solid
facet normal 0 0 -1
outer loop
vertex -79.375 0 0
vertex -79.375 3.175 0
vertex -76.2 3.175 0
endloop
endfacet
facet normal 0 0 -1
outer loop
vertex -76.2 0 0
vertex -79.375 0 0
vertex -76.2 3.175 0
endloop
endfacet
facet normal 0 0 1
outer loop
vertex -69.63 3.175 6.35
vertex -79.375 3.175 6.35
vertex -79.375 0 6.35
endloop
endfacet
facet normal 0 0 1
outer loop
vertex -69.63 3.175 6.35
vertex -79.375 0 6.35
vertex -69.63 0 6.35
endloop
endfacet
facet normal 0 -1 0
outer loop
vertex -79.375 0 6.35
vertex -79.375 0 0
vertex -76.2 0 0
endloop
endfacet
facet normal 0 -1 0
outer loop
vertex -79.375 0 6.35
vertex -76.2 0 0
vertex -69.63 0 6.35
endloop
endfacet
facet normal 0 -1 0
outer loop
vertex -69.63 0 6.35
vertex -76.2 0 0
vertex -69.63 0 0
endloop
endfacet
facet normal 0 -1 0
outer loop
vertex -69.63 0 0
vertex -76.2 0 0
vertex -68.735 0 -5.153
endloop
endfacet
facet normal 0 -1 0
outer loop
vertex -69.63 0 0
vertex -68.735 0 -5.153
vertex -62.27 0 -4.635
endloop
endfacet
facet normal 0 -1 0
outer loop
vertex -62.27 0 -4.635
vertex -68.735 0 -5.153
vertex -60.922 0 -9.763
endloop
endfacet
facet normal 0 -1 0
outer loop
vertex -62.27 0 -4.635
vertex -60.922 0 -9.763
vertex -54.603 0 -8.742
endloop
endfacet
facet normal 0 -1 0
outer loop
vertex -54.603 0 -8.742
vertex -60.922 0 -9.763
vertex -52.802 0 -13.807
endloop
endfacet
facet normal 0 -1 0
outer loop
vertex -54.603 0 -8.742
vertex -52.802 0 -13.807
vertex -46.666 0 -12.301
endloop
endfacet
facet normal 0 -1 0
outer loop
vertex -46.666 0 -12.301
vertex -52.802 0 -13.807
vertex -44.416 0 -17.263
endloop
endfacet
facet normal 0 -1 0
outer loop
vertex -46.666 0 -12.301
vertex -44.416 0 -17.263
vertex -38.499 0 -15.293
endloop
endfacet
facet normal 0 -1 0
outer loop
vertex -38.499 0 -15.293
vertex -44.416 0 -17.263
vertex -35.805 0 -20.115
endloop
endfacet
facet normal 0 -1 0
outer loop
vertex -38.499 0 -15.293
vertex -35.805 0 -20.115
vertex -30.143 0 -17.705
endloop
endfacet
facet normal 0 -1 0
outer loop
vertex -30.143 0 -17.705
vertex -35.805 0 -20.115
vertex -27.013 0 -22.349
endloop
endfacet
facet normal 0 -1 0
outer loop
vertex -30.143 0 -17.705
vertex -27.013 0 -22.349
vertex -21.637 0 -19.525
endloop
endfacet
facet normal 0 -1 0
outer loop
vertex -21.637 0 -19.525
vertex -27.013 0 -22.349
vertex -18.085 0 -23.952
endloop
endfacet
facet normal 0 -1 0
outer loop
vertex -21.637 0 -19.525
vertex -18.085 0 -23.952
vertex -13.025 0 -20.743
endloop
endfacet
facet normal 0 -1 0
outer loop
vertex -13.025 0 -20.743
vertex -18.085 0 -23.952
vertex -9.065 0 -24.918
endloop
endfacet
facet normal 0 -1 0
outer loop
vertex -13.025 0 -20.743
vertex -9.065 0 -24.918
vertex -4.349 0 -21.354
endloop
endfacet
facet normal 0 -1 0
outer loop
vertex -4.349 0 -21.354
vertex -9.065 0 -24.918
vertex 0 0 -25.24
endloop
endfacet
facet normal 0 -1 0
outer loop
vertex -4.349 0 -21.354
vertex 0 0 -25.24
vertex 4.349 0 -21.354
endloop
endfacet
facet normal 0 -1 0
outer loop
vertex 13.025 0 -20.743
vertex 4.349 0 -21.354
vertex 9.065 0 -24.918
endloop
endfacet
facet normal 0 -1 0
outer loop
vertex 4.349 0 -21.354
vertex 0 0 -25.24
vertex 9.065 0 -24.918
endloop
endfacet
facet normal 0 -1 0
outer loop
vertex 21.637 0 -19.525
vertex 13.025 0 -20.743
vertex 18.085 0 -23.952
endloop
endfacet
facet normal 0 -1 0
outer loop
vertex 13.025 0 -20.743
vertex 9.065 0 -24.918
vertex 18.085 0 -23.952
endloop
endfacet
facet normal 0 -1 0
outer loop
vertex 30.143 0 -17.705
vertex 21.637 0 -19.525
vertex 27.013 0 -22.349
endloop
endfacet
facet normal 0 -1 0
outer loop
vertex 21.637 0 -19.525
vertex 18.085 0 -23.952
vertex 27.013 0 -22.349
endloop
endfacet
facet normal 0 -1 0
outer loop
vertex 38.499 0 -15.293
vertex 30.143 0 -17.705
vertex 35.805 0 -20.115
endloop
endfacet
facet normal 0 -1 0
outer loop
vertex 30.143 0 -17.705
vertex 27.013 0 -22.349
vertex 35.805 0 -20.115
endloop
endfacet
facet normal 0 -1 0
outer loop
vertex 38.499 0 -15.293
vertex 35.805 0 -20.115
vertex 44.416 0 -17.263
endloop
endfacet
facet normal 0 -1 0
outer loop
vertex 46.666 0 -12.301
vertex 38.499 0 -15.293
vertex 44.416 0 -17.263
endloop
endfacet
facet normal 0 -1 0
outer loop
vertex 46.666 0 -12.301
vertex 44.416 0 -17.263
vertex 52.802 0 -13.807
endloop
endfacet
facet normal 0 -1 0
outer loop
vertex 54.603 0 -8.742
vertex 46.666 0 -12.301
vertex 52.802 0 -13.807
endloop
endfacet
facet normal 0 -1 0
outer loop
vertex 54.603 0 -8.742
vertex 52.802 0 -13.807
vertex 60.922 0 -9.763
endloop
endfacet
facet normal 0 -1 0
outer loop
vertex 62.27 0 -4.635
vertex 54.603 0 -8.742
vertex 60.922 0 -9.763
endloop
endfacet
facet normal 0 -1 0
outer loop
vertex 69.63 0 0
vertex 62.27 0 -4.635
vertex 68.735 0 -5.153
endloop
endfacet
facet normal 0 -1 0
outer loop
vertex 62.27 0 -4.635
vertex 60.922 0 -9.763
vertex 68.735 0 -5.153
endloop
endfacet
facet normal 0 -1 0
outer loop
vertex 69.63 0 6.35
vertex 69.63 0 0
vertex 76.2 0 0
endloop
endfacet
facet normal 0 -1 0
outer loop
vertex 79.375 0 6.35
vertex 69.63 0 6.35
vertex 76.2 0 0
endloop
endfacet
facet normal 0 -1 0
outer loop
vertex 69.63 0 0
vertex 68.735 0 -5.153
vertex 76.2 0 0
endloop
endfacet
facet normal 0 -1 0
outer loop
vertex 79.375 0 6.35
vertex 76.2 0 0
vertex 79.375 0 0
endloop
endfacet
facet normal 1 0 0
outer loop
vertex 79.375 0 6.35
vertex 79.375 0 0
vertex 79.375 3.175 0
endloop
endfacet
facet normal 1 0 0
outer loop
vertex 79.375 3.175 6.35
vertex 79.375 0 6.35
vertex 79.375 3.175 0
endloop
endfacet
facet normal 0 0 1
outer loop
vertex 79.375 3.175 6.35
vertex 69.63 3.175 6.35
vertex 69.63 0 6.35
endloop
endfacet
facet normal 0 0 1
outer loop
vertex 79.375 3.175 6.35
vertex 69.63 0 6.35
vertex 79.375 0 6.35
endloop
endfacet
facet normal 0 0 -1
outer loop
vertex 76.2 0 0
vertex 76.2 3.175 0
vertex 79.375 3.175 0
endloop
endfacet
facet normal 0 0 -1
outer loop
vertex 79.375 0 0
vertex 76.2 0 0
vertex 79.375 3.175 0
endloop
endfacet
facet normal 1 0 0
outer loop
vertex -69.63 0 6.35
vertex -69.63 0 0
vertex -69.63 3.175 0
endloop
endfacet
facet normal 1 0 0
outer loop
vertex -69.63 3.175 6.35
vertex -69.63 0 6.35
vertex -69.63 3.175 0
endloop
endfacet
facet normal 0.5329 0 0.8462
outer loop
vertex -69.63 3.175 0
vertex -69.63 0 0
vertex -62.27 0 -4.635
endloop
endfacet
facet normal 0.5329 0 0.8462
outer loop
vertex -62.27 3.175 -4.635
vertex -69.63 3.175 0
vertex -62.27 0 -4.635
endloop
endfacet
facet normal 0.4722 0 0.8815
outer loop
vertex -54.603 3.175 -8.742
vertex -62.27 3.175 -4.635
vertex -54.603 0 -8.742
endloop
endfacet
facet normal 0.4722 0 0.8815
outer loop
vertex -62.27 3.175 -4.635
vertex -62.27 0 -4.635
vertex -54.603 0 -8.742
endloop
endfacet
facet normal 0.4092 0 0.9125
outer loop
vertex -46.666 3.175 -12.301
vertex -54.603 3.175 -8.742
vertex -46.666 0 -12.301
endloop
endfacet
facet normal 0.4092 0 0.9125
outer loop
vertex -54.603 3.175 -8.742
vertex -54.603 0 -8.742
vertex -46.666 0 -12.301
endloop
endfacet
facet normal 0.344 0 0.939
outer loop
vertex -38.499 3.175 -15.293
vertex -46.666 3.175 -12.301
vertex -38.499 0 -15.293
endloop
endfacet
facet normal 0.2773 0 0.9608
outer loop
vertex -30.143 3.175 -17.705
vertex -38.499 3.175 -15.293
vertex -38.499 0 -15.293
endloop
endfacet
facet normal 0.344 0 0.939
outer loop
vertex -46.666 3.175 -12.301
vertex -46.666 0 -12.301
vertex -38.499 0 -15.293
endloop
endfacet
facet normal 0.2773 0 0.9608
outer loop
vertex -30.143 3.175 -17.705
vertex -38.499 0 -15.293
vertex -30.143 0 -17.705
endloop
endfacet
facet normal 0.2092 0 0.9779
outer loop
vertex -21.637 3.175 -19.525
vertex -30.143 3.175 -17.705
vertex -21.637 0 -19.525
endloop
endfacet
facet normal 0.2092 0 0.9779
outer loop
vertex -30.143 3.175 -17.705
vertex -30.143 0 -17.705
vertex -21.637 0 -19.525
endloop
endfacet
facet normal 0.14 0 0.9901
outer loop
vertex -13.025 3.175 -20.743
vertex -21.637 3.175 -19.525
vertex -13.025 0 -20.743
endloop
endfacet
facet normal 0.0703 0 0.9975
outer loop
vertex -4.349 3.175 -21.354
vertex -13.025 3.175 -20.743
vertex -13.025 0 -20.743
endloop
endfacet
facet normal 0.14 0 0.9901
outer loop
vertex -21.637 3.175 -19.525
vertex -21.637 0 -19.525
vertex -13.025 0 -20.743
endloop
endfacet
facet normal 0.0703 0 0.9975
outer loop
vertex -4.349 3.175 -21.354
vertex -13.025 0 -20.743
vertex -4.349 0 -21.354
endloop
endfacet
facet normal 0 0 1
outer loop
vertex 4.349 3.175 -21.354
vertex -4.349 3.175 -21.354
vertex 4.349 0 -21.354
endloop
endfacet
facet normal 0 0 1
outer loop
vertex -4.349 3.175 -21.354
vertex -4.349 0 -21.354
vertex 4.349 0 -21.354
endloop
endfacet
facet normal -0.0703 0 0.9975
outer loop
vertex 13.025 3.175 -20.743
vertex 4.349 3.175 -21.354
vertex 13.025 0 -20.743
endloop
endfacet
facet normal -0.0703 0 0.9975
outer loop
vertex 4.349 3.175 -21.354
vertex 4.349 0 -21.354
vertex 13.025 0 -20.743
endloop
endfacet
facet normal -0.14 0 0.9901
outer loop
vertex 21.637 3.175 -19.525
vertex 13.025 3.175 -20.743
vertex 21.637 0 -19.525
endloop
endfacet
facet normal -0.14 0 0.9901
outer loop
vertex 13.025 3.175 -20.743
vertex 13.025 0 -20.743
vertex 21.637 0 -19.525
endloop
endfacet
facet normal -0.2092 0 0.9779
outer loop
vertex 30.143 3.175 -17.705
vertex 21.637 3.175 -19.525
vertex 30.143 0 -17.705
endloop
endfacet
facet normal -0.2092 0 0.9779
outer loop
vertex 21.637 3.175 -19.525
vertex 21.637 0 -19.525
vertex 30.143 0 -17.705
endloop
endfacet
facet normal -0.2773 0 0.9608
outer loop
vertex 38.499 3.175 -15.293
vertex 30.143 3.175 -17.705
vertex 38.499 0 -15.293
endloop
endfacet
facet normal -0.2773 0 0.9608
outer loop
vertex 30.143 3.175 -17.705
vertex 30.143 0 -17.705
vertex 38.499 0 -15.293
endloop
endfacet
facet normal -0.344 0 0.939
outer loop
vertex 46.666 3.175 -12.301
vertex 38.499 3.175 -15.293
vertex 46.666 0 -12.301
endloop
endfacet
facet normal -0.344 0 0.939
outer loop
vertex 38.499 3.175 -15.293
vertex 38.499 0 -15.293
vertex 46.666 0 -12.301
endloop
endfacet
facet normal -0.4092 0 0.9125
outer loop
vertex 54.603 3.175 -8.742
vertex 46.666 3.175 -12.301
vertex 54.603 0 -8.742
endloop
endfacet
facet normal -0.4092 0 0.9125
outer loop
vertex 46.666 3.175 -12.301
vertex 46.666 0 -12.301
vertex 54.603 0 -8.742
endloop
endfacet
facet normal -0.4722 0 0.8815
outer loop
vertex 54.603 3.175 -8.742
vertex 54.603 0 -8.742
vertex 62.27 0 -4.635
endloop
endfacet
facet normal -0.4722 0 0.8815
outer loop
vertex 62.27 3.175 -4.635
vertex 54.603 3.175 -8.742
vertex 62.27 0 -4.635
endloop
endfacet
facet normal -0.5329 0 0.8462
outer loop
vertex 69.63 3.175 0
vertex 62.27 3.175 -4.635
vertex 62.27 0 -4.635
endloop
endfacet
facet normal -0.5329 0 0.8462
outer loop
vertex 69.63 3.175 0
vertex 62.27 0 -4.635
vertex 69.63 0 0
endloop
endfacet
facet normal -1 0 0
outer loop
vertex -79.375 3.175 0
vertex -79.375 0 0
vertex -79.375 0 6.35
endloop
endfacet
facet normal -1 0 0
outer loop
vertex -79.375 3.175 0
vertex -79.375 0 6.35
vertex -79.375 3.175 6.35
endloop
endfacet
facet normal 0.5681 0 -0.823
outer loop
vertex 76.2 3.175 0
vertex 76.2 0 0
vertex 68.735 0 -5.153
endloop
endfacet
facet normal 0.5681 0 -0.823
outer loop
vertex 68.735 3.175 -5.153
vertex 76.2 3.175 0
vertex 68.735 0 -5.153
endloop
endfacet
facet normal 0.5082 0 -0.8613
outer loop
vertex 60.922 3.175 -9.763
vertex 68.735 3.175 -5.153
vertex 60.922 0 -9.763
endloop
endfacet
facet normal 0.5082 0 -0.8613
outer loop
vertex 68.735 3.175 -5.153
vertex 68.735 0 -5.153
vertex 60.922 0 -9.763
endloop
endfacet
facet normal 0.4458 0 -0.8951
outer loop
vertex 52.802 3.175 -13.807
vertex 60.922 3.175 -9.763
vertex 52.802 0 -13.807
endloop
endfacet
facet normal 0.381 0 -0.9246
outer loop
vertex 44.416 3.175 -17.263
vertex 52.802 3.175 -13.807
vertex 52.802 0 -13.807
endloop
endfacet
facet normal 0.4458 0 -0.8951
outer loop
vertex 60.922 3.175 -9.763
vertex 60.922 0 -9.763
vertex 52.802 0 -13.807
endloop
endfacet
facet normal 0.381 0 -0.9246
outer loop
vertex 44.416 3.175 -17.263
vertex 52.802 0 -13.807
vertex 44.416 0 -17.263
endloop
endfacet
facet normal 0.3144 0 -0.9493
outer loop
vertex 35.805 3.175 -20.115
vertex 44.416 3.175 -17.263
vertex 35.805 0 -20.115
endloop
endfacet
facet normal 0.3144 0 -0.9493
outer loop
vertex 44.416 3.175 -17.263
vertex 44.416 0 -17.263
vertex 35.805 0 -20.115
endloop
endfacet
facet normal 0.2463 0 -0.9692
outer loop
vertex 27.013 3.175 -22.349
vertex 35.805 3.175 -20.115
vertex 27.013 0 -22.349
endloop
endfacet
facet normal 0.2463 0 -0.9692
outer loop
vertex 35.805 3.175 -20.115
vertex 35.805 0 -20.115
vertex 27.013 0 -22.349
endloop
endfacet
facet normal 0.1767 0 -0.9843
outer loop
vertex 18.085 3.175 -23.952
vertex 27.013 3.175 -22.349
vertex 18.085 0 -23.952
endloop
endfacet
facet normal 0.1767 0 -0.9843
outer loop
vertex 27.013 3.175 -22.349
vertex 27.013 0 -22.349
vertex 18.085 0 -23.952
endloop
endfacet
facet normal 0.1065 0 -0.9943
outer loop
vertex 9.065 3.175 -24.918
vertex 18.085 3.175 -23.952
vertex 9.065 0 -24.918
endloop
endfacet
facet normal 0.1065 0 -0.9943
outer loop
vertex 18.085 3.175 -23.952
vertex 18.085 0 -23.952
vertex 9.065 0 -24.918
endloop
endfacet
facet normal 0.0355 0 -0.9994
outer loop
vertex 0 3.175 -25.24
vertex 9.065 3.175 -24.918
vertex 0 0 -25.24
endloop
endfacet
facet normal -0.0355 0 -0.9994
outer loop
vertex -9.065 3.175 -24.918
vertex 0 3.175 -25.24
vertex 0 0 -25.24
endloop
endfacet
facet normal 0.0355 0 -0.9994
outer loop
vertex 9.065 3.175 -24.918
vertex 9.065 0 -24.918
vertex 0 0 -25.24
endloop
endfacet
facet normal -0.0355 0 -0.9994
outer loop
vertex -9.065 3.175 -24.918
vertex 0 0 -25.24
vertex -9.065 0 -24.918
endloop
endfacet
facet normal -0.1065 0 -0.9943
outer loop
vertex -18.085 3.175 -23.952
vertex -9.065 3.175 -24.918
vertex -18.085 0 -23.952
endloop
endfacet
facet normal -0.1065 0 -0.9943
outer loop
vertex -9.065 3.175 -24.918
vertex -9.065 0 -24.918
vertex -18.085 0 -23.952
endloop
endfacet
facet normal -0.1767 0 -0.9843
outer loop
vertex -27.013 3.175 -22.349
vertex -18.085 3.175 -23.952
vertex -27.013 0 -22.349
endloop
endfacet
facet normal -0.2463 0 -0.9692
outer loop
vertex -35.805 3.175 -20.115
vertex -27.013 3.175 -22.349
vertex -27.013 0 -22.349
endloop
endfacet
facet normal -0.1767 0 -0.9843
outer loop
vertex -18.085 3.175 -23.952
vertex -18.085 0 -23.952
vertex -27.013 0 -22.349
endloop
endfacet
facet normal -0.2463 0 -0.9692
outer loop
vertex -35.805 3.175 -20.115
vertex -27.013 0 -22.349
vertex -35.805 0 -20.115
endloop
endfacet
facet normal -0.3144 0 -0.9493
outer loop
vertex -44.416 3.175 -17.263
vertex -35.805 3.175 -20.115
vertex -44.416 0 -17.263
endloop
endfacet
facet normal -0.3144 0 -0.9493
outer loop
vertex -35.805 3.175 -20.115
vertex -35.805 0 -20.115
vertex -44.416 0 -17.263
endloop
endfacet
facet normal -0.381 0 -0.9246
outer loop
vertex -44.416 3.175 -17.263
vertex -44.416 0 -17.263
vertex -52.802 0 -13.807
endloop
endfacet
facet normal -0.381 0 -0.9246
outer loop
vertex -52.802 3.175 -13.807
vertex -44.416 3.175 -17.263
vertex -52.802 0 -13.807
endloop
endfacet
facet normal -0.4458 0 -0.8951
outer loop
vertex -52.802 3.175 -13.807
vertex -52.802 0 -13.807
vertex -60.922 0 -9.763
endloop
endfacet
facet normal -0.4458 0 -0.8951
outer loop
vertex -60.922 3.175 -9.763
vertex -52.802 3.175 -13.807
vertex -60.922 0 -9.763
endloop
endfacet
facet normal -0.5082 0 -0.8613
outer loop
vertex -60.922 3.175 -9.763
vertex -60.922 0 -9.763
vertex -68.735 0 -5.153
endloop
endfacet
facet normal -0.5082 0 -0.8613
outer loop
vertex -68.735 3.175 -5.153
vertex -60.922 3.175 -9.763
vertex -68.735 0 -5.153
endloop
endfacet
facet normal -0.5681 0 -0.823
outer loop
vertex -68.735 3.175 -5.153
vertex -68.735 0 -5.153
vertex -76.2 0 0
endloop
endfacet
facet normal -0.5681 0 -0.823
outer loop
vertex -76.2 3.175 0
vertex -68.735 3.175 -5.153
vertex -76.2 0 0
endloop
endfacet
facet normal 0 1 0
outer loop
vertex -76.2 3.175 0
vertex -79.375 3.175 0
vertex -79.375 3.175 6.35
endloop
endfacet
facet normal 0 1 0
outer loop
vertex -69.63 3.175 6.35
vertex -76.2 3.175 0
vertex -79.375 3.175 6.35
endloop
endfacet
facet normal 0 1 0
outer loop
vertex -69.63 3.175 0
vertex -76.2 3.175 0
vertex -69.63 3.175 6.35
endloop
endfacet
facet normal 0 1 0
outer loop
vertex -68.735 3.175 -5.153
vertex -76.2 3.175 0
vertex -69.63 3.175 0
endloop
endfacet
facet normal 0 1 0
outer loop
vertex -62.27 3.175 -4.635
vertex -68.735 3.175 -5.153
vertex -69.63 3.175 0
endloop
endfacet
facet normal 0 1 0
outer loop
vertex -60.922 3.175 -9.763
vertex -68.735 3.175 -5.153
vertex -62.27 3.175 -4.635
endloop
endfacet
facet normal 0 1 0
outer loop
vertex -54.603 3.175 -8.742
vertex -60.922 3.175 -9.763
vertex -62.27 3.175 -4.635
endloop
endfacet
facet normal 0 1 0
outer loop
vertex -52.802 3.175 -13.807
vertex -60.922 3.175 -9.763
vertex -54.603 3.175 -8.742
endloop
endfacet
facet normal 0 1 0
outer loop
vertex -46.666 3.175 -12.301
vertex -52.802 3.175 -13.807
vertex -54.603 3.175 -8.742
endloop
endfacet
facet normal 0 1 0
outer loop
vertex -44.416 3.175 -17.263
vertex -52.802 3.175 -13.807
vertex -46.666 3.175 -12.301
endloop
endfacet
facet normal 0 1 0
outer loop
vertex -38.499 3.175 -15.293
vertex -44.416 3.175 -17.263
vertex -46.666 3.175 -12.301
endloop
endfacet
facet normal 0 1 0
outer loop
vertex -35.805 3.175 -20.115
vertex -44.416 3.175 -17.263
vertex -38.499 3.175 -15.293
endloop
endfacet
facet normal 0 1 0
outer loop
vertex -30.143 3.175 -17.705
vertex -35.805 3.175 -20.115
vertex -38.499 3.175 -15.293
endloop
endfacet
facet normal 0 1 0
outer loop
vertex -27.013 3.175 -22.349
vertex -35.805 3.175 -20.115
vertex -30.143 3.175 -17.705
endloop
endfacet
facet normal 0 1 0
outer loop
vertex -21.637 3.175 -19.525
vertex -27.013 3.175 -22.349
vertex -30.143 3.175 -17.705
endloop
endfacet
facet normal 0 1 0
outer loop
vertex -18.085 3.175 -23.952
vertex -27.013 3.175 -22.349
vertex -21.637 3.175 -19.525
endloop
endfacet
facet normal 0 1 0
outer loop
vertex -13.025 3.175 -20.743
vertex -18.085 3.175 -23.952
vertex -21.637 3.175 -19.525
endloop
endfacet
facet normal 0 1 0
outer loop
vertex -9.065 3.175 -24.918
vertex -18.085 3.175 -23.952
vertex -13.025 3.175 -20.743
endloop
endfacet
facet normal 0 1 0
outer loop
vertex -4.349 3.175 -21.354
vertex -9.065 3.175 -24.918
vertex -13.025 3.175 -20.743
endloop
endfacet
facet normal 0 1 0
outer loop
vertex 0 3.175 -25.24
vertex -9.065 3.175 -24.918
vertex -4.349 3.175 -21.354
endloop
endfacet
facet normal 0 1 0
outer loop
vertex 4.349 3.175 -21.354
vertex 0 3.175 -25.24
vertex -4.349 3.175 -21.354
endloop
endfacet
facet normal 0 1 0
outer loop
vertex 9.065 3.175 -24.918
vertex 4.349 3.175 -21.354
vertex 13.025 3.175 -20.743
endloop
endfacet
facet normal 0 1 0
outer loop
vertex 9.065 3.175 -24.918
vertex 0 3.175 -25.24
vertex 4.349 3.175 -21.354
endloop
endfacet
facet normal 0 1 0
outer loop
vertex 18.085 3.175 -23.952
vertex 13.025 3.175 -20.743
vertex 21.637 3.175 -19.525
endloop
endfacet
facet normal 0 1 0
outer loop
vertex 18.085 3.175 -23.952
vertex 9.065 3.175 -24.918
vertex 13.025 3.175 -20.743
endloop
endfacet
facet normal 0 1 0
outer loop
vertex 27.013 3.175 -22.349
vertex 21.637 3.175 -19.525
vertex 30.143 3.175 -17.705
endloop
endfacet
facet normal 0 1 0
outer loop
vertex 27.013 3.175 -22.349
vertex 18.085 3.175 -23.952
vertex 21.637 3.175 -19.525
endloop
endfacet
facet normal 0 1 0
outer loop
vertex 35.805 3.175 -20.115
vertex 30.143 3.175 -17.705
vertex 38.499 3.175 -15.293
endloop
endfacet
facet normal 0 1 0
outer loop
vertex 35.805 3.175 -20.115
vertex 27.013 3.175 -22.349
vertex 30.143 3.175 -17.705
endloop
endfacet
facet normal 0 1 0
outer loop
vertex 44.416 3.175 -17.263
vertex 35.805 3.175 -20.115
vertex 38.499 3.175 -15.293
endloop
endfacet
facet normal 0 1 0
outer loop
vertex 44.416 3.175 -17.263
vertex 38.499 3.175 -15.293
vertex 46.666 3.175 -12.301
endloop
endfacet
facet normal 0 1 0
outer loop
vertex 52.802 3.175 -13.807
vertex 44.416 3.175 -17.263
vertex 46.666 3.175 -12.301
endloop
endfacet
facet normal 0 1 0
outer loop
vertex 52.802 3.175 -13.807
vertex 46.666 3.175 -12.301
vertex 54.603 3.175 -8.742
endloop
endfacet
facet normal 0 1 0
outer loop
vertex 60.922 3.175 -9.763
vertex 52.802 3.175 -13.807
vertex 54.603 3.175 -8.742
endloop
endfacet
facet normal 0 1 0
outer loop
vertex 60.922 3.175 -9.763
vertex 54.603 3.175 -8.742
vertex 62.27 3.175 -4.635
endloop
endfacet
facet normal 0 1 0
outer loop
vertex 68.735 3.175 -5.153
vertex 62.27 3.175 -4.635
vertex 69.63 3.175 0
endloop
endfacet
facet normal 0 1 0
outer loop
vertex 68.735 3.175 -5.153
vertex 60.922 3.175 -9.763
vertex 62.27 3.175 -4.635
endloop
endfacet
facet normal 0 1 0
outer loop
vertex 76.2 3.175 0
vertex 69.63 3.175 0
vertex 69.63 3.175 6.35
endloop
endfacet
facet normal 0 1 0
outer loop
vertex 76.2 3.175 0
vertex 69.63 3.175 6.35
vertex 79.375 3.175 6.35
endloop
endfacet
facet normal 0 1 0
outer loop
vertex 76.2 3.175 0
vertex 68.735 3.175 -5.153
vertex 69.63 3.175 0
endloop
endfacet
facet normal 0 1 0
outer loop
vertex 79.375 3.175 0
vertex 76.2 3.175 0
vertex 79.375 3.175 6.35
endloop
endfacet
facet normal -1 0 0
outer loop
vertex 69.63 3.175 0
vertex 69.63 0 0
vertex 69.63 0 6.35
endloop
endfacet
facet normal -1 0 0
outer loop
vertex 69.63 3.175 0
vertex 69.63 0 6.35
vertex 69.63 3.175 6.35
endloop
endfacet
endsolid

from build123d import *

# Parameters (mm, degrees)
BOSS_EXTRUDE2_DEPTH = 3.175
SKETCH2_W           = 9.745232509
SKETCH2_H           = 3.175
BOSS_EXTRUDE3_DEPTH = 6.35


with BuildPart() as part:
    # Sketch1 → Boss-Extrude2 (new body)
    with BuildSketch(Plane(origin=(0, 0, 0), x_dir=(1, 0, 0), z_dir=(0, 1, 0))):
        with BuildLine():
            Line((-76.2, 0), (-69.629767491, 0))
            ThreePointArc((-69.629767491, 0), (0, 21.43), (69.629767491, 0))
            Line((69.629767491, 0), (76.2, 0))
            ThreePointArc((76.2, 0), (0, 25.24), (-76.2, 0))
        make_face()
    extrude(amount=BOSS_EXTRUDE2_DEPTH)

    # Sketch2 → Boss-Extrude3 (add)
    with BuildSketch(Plane.XY):
        with Locations((-74.502383745, 1.5875)):
            Rectangle(SKETCH2_W, SKETCH2_H)
        with Locations((74.502383745, 1.5875)):
            Rectangle(SKETCH2_W, SKETCH2_H)
    extrude(amount=BOSS_EXTRUDE3_DEPTH)


solid = part.part
